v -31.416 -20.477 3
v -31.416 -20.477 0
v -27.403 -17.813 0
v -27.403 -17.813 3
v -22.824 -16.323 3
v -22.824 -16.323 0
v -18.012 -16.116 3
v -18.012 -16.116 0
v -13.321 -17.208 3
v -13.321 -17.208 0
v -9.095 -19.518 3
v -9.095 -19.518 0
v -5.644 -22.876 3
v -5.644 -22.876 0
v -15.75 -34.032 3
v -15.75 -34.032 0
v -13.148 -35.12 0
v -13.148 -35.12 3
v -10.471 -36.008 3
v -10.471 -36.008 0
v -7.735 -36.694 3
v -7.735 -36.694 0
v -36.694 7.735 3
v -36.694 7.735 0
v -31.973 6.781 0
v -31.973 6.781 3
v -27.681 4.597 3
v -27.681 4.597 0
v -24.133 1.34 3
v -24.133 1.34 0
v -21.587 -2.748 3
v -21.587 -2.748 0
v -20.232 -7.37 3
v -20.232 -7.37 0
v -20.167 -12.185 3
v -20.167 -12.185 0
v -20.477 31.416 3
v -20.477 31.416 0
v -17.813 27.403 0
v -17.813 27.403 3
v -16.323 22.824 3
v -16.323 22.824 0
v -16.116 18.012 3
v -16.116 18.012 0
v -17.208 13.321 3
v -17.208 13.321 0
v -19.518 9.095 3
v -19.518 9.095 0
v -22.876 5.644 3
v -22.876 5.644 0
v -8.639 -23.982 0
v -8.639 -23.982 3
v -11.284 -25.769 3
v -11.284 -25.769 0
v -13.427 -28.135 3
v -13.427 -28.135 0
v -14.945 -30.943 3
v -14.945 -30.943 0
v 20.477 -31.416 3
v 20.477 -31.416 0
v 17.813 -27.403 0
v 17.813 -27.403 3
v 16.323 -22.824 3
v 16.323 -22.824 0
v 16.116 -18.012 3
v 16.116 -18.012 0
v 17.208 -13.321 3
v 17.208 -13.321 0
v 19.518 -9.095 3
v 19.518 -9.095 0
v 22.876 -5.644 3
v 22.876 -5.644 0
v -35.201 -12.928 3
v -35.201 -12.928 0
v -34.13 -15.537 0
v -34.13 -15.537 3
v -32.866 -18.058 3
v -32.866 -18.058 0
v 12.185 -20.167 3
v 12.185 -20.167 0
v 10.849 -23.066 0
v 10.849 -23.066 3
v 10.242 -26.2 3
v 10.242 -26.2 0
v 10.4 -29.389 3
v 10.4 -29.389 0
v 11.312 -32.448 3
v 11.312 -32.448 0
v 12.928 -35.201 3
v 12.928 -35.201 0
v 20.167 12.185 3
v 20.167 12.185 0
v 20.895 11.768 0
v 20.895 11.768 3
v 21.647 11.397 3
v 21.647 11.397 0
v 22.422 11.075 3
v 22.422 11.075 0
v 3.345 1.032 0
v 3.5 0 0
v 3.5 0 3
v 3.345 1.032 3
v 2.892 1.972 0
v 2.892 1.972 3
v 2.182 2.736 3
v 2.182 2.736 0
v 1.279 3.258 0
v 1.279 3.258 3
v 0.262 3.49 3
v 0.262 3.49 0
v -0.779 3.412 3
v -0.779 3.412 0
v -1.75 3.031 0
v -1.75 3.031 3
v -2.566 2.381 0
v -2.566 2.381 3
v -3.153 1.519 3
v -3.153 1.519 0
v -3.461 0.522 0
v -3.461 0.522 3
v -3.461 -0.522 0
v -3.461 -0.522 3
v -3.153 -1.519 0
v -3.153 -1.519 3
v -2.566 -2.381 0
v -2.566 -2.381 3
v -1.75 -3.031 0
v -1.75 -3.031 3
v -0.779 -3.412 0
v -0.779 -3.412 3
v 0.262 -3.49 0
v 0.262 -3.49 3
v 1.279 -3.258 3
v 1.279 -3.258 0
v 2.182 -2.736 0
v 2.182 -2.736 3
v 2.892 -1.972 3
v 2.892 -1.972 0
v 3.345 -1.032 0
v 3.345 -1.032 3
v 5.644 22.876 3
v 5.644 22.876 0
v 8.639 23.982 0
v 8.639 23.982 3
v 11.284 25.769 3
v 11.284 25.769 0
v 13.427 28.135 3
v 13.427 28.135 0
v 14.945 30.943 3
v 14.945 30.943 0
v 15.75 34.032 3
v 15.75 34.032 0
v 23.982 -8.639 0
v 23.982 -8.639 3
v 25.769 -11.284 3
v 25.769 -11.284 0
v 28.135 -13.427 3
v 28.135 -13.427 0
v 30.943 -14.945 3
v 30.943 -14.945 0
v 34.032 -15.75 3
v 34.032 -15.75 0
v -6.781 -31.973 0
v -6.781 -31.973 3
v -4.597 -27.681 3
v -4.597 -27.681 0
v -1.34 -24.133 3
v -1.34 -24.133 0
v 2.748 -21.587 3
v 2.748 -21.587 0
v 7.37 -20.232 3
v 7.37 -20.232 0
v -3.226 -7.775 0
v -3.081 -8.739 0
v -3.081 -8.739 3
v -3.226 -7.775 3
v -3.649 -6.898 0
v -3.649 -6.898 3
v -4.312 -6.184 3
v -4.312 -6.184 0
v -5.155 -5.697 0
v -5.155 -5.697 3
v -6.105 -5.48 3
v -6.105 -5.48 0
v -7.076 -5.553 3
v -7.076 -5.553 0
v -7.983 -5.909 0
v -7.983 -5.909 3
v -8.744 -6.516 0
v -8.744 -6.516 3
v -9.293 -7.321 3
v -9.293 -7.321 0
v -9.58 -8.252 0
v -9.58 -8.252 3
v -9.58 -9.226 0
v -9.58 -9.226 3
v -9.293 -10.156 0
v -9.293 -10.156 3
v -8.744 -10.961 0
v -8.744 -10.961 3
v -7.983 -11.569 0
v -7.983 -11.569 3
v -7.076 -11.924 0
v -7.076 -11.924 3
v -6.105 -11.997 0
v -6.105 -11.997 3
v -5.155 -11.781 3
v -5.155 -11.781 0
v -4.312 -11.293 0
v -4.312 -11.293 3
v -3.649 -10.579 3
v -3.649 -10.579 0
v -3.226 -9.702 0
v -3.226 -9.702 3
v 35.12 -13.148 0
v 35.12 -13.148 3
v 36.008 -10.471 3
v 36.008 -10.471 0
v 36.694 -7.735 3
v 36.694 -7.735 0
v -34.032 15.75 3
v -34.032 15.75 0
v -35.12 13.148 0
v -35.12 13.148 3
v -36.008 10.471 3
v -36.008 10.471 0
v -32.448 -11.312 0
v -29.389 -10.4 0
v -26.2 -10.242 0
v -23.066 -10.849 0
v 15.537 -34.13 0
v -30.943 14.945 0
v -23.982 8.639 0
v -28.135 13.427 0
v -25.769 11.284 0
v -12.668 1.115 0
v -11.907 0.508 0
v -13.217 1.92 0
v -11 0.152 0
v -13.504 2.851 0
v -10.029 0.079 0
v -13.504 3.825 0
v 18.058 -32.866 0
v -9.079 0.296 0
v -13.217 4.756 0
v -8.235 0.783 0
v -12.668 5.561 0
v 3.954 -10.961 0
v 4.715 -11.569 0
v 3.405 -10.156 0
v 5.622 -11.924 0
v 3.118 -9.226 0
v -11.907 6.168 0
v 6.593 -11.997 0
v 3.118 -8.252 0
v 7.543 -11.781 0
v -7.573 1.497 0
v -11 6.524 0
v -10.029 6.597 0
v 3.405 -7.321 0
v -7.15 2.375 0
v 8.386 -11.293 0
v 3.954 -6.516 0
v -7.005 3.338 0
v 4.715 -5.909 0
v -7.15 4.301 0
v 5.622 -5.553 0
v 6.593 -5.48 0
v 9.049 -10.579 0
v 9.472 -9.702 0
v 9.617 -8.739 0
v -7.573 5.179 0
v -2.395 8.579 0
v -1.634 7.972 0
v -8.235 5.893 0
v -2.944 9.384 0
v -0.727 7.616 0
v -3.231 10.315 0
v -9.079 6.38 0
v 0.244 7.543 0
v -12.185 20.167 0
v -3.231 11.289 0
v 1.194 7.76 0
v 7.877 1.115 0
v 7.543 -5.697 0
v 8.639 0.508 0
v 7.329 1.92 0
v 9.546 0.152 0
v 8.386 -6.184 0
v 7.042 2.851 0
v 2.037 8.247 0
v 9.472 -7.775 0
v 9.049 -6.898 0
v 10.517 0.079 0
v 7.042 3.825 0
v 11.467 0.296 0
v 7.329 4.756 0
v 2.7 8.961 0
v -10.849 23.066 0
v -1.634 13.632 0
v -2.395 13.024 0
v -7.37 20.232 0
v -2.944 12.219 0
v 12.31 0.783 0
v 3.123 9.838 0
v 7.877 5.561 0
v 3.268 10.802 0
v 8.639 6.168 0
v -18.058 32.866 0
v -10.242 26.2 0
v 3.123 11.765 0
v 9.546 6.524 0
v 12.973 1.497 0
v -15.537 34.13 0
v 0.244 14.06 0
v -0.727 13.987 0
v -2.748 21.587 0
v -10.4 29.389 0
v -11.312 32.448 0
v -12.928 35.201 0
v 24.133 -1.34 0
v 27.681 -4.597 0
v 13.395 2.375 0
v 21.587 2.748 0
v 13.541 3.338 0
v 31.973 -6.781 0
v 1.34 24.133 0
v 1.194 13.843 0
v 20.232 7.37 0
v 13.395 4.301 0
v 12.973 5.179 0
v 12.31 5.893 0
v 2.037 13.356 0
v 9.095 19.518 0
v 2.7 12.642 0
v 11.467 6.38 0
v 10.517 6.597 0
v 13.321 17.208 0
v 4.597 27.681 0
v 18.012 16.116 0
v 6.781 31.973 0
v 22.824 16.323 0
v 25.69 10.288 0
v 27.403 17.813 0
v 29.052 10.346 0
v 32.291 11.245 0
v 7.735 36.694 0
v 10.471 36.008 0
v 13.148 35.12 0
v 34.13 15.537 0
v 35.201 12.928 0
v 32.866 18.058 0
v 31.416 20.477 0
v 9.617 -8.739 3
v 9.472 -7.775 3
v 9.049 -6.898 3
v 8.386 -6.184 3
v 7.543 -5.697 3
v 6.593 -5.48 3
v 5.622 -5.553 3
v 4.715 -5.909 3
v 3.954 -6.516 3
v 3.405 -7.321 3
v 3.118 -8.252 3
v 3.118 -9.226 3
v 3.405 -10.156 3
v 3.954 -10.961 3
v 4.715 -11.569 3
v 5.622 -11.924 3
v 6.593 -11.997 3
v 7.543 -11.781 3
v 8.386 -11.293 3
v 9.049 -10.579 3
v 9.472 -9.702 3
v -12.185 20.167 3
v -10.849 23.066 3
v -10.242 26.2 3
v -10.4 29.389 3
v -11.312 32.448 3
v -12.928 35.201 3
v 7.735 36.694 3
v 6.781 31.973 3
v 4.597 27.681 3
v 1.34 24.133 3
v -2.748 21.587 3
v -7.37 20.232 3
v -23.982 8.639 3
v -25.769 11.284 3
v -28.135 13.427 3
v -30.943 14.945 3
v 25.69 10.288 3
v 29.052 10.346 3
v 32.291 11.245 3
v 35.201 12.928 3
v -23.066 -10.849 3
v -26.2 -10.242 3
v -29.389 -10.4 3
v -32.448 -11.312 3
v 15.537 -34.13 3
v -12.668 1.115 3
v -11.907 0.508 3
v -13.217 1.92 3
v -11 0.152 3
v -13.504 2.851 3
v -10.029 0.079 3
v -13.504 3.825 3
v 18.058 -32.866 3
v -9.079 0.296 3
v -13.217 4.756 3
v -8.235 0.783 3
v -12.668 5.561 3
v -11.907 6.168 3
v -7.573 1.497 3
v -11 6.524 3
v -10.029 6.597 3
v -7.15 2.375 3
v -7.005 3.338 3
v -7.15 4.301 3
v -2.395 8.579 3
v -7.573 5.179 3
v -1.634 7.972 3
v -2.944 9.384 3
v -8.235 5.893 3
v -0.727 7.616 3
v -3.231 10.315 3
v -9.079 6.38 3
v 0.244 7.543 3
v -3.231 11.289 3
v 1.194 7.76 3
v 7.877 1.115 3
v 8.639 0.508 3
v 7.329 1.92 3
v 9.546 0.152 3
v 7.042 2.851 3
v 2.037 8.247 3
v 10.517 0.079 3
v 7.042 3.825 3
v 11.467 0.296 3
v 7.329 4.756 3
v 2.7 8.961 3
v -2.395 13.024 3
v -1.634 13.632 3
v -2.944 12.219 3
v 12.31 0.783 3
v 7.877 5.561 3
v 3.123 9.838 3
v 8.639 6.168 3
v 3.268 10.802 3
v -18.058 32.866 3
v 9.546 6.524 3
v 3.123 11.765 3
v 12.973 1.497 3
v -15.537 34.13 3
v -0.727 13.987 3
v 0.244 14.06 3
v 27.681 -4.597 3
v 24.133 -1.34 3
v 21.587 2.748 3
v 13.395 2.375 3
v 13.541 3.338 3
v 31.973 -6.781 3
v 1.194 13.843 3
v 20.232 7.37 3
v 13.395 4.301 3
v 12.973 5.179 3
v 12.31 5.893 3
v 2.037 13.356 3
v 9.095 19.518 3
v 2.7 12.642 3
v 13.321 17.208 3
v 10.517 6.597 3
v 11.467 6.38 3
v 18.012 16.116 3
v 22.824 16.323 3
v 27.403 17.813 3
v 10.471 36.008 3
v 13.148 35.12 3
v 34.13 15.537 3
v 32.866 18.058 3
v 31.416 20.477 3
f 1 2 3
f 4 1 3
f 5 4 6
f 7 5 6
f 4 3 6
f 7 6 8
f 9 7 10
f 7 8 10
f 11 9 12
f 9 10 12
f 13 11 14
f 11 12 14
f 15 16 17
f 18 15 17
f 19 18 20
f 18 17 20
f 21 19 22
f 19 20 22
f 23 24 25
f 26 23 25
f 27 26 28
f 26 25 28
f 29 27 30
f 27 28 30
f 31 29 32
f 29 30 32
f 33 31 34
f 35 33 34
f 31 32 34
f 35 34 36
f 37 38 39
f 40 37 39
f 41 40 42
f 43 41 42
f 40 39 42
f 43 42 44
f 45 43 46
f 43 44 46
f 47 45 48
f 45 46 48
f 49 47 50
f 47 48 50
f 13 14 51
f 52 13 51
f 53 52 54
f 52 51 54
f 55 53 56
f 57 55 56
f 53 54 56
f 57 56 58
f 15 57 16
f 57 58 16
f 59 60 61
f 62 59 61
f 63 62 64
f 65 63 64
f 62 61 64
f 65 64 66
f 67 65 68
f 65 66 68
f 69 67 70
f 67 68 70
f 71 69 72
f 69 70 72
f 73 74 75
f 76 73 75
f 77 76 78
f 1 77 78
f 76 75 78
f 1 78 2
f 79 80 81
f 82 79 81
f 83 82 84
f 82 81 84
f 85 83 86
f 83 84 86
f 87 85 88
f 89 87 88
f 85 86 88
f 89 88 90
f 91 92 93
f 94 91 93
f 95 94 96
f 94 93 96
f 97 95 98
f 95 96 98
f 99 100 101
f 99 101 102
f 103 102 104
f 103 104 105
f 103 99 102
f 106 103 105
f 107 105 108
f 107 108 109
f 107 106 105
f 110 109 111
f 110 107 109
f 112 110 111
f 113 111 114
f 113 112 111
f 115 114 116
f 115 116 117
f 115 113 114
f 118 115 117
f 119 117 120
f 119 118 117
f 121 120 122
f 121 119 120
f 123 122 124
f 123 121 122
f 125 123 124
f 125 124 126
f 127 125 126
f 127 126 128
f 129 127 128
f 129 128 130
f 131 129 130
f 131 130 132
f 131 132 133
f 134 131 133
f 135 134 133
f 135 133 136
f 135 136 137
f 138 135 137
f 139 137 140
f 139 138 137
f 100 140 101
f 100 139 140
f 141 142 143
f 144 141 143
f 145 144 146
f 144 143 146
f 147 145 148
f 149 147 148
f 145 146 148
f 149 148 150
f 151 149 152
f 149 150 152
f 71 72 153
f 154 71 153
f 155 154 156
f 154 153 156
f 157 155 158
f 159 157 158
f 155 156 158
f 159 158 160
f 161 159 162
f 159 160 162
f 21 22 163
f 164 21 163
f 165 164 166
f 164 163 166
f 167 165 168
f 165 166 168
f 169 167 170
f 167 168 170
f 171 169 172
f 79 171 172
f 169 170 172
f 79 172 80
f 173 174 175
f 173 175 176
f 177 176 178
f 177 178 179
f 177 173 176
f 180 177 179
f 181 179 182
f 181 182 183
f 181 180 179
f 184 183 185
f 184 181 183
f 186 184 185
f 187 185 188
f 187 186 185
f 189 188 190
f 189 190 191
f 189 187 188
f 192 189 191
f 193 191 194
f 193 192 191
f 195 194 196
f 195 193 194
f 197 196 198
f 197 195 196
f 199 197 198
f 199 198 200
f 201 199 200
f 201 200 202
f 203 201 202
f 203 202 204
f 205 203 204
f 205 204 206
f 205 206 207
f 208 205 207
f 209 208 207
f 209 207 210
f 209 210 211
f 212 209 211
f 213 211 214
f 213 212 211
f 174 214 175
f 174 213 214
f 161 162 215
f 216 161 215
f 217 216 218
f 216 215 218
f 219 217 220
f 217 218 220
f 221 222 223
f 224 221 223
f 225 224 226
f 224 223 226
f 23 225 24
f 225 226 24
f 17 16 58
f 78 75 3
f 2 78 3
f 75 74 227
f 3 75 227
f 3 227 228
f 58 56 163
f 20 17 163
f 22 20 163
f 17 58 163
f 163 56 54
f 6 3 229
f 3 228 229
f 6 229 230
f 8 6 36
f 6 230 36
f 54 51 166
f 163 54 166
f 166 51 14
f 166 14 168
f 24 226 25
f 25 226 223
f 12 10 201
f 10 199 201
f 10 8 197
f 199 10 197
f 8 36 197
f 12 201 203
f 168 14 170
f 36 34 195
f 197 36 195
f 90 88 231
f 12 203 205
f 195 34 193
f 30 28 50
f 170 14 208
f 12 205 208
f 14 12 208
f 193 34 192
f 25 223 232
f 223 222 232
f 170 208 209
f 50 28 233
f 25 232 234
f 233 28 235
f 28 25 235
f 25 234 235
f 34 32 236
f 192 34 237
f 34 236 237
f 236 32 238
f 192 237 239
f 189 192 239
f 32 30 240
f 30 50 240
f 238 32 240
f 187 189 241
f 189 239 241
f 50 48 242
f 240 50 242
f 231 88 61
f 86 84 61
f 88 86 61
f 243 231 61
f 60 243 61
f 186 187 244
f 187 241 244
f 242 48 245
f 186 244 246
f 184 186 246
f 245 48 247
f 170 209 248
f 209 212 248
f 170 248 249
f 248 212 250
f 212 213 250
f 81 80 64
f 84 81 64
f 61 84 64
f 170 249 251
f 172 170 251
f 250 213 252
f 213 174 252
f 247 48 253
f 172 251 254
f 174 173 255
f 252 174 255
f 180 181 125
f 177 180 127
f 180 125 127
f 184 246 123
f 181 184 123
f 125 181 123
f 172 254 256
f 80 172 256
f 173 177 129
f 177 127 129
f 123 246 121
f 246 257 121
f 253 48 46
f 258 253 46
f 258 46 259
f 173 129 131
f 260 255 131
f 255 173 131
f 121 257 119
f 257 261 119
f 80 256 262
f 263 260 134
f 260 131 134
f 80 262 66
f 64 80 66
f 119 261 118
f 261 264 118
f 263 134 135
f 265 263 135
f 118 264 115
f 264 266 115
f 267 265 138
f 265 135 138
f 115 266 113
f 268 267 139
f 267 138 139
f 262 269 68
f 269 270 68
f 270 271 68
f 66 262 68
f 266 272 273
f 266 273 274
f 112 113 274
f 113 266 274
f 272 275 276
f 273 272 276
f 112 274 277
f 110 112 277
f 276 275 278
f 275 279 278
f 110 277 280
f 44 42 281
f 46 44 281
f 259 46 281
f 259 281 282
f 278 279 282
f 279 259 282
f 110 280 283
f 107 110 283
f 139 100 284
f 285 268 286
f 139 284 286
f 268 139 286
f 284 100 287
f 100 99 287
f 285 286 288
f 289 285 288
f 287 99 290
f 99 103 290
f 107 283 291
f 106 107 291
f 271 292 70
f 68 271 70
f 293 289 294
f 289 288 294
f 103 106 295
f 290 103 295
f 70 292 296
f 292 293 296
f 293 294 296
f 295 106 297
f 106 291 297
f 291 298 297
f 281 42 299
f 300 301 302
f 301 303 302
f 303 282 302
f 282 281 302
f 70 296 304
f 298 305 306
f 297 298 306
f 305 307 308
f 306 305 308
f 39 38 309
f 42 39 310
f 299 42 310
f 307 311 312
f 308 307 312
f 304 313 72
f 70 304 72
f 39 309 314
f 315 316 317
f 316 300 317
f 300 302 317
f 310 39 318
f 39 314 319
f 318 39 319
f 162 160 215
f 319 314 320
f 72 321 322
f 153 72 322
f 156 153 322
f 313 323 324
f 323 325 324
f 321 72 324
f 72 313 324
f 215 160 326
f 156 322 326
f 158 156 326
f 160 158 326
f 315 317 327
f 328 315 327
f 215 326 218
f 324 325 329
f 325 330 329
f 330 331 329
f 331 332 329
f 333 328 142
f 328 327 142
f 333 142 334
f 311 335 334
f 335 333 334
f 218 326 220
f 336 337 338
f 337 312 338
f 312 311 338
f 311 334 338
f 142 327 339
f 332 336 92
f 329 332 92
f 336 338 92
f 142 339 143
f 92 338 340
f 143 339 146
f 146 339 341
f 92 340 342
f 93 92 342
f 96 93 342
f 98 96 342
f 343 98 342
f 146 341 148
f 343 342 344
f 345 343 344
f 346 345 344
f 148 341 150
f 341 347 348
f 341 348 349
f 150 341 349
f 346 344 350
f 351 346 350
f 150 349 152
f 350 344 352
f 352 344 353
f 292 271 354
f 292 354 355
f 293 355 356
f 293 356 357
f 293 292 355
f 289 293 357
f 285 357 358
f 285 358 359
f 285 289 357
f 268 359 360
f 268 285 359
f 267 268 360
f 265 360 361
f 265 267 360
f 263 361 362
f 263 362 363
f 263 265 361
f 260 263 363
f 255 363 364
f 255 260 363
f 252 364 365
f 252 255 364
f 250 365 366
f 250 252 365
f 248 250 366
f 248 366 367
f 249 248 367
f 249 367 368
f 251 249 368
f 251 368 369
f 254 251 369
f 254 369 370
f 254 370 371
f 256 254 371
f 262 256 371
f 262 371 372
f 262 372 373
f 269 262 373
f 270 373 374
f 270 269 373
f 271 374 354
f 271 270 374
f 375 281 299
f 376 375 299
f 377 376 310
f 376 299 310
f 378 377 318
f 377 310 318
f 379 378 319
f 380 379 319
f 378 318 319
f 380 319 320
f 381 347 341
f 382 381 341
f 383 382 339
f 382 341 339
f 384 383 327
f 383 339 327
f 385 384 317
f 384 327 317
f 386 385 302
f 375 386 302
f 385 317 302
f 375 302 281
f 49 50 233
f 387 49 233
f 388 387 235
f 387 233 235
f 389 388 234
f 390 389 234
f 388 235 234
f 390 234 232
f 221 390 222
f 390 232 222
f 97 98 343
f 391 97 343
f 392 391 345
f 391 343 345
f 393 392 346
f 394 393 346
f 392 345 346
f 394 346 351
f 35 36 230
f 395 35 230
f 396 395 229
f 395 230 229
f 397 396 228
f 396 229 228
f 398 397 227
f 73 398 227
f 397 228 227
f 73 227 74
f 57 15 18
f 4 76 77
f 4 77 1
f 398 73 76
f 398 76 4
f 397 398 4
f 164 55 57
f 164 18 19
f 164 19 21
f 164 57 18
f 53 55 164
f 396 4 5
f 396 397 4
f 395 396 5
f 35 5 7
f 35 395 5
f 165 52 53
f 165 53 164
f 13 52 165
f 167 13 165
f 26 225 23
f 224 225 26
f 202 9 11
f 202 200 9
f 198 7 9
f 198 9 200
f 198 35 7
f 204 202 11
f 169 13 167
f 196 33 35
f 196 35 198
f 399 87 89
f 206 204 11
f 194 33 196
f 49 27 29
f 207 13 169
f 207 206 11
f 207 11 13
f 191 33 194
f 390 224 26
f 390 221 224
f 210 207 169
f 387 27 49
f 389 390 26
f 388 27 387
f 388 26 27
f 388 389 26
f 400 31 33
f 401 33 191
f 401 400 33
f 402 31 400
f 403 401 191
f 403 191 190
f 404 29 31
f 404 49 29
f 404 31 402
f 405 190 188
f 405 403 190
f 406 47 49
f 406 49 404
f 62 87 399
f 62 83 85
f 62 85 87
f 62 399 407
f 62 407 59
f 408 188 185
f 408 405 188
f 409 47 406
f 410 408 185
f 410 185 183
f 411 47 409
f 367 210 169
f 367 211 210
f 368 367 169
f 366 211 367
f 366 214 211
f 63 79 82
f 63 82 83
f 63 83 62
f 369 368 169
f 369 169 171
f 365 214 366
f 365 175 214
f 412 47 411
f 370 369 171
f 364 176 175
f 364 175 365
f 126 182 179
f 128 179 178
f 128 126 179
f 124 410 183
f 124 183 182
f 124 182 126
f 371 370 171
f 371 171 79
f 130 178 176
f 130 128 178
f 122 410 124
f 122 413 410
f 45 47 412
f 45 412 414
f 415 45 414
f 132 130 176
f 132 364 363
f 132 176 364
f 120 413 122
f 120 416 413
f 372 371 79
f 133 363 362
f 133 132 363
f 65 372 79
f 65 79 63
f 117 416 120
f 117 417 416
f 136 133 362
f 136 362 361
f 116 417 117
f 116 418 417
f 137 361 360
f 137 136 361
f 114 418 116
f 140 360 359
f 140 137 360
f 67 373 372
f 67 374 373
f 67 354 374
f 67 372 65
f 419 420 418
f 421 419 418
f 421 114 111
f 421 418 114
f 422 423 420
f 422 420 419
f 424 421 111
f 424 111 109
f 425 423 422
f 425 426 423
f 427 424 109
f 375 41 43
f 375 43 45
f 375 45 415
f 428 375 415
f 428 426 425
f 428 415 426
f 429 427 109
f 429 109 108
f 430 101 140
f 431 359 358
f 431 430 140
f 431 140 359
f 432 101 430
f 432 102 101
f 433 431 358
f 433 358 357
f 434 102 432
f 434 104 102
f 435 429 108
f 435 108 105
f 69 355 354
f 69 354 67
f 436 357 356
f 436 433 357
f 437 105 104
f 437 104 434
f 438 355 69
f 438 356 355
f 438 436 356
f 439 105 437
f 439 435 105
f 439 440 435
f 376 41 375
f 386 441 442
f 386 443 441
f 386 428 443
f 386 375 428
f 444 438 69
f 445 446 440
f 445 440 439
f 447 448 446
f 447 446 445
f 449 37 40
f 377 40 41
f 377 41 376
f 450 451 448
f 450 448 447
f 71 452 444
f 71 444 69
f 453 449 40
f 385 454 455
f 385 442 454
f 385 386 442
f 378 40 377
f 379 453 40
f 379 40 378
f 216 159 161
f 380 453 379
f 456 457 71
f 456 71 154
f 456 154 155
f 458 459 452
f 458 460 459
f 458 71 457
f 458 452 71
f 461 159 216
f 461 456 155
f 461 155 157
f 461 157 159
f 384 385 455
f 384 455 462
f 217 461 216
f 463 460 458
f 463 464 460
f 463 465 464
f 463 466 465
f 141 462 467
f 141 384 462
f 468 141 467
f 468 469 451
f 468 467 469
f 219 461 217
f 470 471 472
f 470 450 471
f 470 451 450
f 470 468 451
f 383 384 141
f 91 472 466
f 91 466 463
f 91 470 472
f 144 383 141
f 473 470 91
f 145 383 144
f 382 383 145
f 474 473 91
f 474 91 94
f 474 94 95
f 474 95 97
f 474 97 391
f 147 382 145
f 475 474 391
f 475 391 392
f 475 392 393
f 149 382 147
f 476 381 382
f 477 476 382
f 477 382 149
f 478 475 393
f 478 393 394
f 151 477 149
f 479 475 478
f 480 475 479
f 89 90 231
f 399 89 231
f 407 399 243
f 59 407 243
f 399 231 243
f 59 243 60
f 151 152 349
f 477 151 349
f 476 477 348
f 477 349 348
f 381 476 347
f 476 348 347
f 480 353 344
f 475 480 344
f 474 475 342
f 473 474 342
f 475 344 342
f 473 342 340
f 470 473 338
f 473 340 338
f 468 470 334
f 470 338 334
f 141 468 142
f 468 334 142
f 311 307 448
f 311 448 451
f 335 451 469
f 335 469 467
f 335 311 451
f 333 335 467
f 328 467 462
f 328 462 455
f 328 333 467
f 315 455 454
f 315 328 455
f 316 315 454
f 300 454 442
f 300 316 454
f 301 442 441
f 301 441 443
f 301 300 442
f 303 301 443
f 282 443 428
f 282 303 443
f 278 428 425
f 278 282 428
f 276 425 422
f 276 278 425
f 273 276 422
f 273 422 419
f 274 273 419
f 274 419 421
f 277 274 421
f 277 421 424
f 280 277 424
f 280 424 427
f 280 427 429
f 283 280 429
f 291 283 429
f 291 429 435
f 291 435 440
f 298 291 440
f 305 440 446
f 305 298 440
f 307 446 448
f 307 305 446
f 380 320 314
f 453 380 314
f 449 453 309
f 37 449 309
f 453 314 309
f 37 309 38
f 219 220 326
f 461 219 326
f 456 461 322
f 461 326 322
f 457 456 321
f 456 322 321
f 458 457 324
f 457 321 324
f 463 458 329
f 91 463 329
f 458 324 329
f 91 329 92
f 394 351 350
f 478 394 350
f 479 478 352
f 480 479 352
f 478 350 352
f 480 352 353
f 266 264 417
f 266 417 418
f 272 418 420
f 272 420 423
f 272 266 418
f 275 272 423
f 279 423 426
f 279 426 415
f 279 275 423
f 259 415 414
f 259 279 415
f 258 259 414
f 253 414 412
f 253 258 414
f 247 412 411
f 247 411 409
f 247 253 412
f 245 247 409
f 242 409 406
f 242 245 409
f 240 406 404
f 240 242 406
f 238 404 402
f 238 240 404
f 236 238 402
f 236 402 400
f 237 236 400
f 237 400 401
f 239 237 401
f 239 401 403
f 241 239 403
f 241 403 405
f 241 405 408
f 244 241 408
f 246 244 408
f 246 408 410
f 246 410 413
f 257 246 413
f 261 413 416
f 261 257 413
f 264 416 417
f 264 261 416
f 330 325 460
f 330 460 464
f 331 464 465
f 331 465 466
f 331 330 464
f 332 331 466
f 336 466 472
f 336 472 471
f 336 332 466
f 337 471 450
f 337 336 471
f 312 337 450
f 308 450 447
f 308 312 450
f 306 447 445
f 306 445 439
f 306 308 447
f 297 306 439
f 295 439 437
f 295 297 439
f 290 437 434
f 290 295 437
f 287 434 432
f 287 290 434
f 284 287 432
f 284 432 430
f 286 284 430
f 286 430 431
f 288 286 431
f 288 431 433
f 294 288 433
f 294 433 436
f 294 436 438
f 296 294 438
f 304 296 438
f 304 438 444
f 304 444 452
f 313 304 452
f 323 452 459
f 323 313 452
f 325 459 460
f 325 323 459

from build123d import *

# Parameters (mm, degrees)
F0_R     = 3.2677789254
F0_R_2   = 3.5
F1_DEPTH = 3


# Not quite as in the source:
# - a feature names something its author has since deleted; it is built from what else it names


with BuildPart() as f1:
    # F0 (on Top) → F1 (new body)
    with BuildSketch(Plane.XY):
        with BuildLine():
            ThreePointArc((-12.185161002, 20.1667081565), (-10.2249151213, 27.7991061308), (-12.9275786797, 35.2012458513))
            ThreePointArc((-12.9275786797, 35.2012458513), (-16.80912748, 33.5216830329), (-20.4768659437, 31.4157279261))
            ThreePointArc((-20.4768659437, 31.4157279261), (-16.1164151017, 18.0121200855), (-22.876226066, 5.6438061173))
            ThreePointArc((-22.876226066, 5.6438061173), (-26.8870432753, 12.4268296367), (-34.0322181964, 15.7498610989))
            ThreePointArc((-34.0322181964, 15.7498610989), (-35.5892574163, 11.8175613624), (-36.6936050187, 7.7349434862))
            ThreePointArc((-36.6936050187, 7.7349434862), (-24.1325186628, 1.3404658492), (-20.1667081565, -12.185161002))
            ThreePointArc((-20.1667081565, -12.185161002), (-27.7991061308, -10.2249151213), (-35.2012458513, -12.9275786797))
            ThreePointArc((-35.2012458513, -12.9275786797), (-33.5216830329, -16.80912748), (-31.4157279261, -20.4768659437))
            ThreePointArc((-31.4157279261, -20.4768659437), (-18.0121200855, -16.1164151017), (-5.6438061173, -22.876226066))
            ThreePointArc((-5.6438061173, -22.876226066), (-12.4268296367, -26.8870432753), (-15.7498610989, -34.0322181964))
            ThreePointArc((-15.7498610989, -34.0322181964), (-11.8175613624, -35.5892574163), (-7.7349434862, -36.6936050187))
            ThreePointArc((-7.7349434862, -36.6936050187), (-1.3404658492, -24.1325186628), (12.185161002, -20.1667081565))
            ThreePointArc((12.185161002, -20.1667081565), (10.2249151213, -27.7991061308), (12.9275786797, -35.2012458513))
            ThreePointArc((12.9275786797, -35.2012458513), (16.80912748, -33.5216830329), (20.4768659437, -31.4157279261))
            ThreePointArc((20.4768659437, -31.4157279261), (16.1164151017, -18.0121200855), (22.876226066, -5.6438061173))
            ThreePointArc((22.876226066, -5.6438061173), (26.8870432753, -12.4268296367), (34.0322181964, -15.7498610989))
            ThreePointArc((34.0322181964, -15.7498610989), (35.5892574163, -11.8175613624), (36.6936050187, -7.7349434862))
            ThreePointArc((36.6936050187, -7.7349434862), (24.1325186628, -1.3404658492), (20.1667081565, 12.185161002))
            ThreePointArc((20.1667081565, 12.185161002), (21.2681317348, 11.5765458519), (22.4221424931, 11.0747436302))
            ThreePointArc((22.4221424931, 11.0747436302), (29.051621985, 10.3463660778), (35.2012458513, 12.9275786797))
            ThreePointArc((35.2012458513, 12.9275786797), (33.5216830329, 16.80912748), (31.4157279261, 20.4768659437))
            ThreePointArc((31.4157279261, 20.4768659437), (18.0121200855, 16.1164151017), (5.6438061173, 22.876226066))
            ThreePointArc((5.6438061173, 22.876226066), (12.4268296367, 26.8870432753), (15.7498610989, 34.0322181964))
            ThreePointArc((15.7498610989, 34.0322181964), (11.8175613624, 35.5892574163), (7.7349434862, 36.6936050187))
            ThreePointArc((7.7349434862, 36.6936050187), (1.3404658492, 24.1325186628), (-12.185161002, 20.1667081565))
        make_face()
        with Locations((-6.3489950769, -8.7386420371)):
            Circle(F0_R, mode=Mode.SUBTRACT)
        with Locations((6.3489950769, -8.7386420371)):
            Circle(F0_R, mode=Mode.SUBTRACT)
        with Locations((-10.2728898289, 3.3378642426)):
            Circle(F0_R, mode=Mode.SUBTRACT)
        Circle(F0_R_2, mode=Mode.SUBTRACT)
        with Locations((10.2728898289, 3.3378642426)):
            Circle(F0_R, mode=Mode.SUBTRACT)
        with Locations((0, 10.8015555888)):
            Circle(F0_R, mode=Mode.SUBTRACT)
    extrude(amount=F1_DEPTH)


solid = f1.part
